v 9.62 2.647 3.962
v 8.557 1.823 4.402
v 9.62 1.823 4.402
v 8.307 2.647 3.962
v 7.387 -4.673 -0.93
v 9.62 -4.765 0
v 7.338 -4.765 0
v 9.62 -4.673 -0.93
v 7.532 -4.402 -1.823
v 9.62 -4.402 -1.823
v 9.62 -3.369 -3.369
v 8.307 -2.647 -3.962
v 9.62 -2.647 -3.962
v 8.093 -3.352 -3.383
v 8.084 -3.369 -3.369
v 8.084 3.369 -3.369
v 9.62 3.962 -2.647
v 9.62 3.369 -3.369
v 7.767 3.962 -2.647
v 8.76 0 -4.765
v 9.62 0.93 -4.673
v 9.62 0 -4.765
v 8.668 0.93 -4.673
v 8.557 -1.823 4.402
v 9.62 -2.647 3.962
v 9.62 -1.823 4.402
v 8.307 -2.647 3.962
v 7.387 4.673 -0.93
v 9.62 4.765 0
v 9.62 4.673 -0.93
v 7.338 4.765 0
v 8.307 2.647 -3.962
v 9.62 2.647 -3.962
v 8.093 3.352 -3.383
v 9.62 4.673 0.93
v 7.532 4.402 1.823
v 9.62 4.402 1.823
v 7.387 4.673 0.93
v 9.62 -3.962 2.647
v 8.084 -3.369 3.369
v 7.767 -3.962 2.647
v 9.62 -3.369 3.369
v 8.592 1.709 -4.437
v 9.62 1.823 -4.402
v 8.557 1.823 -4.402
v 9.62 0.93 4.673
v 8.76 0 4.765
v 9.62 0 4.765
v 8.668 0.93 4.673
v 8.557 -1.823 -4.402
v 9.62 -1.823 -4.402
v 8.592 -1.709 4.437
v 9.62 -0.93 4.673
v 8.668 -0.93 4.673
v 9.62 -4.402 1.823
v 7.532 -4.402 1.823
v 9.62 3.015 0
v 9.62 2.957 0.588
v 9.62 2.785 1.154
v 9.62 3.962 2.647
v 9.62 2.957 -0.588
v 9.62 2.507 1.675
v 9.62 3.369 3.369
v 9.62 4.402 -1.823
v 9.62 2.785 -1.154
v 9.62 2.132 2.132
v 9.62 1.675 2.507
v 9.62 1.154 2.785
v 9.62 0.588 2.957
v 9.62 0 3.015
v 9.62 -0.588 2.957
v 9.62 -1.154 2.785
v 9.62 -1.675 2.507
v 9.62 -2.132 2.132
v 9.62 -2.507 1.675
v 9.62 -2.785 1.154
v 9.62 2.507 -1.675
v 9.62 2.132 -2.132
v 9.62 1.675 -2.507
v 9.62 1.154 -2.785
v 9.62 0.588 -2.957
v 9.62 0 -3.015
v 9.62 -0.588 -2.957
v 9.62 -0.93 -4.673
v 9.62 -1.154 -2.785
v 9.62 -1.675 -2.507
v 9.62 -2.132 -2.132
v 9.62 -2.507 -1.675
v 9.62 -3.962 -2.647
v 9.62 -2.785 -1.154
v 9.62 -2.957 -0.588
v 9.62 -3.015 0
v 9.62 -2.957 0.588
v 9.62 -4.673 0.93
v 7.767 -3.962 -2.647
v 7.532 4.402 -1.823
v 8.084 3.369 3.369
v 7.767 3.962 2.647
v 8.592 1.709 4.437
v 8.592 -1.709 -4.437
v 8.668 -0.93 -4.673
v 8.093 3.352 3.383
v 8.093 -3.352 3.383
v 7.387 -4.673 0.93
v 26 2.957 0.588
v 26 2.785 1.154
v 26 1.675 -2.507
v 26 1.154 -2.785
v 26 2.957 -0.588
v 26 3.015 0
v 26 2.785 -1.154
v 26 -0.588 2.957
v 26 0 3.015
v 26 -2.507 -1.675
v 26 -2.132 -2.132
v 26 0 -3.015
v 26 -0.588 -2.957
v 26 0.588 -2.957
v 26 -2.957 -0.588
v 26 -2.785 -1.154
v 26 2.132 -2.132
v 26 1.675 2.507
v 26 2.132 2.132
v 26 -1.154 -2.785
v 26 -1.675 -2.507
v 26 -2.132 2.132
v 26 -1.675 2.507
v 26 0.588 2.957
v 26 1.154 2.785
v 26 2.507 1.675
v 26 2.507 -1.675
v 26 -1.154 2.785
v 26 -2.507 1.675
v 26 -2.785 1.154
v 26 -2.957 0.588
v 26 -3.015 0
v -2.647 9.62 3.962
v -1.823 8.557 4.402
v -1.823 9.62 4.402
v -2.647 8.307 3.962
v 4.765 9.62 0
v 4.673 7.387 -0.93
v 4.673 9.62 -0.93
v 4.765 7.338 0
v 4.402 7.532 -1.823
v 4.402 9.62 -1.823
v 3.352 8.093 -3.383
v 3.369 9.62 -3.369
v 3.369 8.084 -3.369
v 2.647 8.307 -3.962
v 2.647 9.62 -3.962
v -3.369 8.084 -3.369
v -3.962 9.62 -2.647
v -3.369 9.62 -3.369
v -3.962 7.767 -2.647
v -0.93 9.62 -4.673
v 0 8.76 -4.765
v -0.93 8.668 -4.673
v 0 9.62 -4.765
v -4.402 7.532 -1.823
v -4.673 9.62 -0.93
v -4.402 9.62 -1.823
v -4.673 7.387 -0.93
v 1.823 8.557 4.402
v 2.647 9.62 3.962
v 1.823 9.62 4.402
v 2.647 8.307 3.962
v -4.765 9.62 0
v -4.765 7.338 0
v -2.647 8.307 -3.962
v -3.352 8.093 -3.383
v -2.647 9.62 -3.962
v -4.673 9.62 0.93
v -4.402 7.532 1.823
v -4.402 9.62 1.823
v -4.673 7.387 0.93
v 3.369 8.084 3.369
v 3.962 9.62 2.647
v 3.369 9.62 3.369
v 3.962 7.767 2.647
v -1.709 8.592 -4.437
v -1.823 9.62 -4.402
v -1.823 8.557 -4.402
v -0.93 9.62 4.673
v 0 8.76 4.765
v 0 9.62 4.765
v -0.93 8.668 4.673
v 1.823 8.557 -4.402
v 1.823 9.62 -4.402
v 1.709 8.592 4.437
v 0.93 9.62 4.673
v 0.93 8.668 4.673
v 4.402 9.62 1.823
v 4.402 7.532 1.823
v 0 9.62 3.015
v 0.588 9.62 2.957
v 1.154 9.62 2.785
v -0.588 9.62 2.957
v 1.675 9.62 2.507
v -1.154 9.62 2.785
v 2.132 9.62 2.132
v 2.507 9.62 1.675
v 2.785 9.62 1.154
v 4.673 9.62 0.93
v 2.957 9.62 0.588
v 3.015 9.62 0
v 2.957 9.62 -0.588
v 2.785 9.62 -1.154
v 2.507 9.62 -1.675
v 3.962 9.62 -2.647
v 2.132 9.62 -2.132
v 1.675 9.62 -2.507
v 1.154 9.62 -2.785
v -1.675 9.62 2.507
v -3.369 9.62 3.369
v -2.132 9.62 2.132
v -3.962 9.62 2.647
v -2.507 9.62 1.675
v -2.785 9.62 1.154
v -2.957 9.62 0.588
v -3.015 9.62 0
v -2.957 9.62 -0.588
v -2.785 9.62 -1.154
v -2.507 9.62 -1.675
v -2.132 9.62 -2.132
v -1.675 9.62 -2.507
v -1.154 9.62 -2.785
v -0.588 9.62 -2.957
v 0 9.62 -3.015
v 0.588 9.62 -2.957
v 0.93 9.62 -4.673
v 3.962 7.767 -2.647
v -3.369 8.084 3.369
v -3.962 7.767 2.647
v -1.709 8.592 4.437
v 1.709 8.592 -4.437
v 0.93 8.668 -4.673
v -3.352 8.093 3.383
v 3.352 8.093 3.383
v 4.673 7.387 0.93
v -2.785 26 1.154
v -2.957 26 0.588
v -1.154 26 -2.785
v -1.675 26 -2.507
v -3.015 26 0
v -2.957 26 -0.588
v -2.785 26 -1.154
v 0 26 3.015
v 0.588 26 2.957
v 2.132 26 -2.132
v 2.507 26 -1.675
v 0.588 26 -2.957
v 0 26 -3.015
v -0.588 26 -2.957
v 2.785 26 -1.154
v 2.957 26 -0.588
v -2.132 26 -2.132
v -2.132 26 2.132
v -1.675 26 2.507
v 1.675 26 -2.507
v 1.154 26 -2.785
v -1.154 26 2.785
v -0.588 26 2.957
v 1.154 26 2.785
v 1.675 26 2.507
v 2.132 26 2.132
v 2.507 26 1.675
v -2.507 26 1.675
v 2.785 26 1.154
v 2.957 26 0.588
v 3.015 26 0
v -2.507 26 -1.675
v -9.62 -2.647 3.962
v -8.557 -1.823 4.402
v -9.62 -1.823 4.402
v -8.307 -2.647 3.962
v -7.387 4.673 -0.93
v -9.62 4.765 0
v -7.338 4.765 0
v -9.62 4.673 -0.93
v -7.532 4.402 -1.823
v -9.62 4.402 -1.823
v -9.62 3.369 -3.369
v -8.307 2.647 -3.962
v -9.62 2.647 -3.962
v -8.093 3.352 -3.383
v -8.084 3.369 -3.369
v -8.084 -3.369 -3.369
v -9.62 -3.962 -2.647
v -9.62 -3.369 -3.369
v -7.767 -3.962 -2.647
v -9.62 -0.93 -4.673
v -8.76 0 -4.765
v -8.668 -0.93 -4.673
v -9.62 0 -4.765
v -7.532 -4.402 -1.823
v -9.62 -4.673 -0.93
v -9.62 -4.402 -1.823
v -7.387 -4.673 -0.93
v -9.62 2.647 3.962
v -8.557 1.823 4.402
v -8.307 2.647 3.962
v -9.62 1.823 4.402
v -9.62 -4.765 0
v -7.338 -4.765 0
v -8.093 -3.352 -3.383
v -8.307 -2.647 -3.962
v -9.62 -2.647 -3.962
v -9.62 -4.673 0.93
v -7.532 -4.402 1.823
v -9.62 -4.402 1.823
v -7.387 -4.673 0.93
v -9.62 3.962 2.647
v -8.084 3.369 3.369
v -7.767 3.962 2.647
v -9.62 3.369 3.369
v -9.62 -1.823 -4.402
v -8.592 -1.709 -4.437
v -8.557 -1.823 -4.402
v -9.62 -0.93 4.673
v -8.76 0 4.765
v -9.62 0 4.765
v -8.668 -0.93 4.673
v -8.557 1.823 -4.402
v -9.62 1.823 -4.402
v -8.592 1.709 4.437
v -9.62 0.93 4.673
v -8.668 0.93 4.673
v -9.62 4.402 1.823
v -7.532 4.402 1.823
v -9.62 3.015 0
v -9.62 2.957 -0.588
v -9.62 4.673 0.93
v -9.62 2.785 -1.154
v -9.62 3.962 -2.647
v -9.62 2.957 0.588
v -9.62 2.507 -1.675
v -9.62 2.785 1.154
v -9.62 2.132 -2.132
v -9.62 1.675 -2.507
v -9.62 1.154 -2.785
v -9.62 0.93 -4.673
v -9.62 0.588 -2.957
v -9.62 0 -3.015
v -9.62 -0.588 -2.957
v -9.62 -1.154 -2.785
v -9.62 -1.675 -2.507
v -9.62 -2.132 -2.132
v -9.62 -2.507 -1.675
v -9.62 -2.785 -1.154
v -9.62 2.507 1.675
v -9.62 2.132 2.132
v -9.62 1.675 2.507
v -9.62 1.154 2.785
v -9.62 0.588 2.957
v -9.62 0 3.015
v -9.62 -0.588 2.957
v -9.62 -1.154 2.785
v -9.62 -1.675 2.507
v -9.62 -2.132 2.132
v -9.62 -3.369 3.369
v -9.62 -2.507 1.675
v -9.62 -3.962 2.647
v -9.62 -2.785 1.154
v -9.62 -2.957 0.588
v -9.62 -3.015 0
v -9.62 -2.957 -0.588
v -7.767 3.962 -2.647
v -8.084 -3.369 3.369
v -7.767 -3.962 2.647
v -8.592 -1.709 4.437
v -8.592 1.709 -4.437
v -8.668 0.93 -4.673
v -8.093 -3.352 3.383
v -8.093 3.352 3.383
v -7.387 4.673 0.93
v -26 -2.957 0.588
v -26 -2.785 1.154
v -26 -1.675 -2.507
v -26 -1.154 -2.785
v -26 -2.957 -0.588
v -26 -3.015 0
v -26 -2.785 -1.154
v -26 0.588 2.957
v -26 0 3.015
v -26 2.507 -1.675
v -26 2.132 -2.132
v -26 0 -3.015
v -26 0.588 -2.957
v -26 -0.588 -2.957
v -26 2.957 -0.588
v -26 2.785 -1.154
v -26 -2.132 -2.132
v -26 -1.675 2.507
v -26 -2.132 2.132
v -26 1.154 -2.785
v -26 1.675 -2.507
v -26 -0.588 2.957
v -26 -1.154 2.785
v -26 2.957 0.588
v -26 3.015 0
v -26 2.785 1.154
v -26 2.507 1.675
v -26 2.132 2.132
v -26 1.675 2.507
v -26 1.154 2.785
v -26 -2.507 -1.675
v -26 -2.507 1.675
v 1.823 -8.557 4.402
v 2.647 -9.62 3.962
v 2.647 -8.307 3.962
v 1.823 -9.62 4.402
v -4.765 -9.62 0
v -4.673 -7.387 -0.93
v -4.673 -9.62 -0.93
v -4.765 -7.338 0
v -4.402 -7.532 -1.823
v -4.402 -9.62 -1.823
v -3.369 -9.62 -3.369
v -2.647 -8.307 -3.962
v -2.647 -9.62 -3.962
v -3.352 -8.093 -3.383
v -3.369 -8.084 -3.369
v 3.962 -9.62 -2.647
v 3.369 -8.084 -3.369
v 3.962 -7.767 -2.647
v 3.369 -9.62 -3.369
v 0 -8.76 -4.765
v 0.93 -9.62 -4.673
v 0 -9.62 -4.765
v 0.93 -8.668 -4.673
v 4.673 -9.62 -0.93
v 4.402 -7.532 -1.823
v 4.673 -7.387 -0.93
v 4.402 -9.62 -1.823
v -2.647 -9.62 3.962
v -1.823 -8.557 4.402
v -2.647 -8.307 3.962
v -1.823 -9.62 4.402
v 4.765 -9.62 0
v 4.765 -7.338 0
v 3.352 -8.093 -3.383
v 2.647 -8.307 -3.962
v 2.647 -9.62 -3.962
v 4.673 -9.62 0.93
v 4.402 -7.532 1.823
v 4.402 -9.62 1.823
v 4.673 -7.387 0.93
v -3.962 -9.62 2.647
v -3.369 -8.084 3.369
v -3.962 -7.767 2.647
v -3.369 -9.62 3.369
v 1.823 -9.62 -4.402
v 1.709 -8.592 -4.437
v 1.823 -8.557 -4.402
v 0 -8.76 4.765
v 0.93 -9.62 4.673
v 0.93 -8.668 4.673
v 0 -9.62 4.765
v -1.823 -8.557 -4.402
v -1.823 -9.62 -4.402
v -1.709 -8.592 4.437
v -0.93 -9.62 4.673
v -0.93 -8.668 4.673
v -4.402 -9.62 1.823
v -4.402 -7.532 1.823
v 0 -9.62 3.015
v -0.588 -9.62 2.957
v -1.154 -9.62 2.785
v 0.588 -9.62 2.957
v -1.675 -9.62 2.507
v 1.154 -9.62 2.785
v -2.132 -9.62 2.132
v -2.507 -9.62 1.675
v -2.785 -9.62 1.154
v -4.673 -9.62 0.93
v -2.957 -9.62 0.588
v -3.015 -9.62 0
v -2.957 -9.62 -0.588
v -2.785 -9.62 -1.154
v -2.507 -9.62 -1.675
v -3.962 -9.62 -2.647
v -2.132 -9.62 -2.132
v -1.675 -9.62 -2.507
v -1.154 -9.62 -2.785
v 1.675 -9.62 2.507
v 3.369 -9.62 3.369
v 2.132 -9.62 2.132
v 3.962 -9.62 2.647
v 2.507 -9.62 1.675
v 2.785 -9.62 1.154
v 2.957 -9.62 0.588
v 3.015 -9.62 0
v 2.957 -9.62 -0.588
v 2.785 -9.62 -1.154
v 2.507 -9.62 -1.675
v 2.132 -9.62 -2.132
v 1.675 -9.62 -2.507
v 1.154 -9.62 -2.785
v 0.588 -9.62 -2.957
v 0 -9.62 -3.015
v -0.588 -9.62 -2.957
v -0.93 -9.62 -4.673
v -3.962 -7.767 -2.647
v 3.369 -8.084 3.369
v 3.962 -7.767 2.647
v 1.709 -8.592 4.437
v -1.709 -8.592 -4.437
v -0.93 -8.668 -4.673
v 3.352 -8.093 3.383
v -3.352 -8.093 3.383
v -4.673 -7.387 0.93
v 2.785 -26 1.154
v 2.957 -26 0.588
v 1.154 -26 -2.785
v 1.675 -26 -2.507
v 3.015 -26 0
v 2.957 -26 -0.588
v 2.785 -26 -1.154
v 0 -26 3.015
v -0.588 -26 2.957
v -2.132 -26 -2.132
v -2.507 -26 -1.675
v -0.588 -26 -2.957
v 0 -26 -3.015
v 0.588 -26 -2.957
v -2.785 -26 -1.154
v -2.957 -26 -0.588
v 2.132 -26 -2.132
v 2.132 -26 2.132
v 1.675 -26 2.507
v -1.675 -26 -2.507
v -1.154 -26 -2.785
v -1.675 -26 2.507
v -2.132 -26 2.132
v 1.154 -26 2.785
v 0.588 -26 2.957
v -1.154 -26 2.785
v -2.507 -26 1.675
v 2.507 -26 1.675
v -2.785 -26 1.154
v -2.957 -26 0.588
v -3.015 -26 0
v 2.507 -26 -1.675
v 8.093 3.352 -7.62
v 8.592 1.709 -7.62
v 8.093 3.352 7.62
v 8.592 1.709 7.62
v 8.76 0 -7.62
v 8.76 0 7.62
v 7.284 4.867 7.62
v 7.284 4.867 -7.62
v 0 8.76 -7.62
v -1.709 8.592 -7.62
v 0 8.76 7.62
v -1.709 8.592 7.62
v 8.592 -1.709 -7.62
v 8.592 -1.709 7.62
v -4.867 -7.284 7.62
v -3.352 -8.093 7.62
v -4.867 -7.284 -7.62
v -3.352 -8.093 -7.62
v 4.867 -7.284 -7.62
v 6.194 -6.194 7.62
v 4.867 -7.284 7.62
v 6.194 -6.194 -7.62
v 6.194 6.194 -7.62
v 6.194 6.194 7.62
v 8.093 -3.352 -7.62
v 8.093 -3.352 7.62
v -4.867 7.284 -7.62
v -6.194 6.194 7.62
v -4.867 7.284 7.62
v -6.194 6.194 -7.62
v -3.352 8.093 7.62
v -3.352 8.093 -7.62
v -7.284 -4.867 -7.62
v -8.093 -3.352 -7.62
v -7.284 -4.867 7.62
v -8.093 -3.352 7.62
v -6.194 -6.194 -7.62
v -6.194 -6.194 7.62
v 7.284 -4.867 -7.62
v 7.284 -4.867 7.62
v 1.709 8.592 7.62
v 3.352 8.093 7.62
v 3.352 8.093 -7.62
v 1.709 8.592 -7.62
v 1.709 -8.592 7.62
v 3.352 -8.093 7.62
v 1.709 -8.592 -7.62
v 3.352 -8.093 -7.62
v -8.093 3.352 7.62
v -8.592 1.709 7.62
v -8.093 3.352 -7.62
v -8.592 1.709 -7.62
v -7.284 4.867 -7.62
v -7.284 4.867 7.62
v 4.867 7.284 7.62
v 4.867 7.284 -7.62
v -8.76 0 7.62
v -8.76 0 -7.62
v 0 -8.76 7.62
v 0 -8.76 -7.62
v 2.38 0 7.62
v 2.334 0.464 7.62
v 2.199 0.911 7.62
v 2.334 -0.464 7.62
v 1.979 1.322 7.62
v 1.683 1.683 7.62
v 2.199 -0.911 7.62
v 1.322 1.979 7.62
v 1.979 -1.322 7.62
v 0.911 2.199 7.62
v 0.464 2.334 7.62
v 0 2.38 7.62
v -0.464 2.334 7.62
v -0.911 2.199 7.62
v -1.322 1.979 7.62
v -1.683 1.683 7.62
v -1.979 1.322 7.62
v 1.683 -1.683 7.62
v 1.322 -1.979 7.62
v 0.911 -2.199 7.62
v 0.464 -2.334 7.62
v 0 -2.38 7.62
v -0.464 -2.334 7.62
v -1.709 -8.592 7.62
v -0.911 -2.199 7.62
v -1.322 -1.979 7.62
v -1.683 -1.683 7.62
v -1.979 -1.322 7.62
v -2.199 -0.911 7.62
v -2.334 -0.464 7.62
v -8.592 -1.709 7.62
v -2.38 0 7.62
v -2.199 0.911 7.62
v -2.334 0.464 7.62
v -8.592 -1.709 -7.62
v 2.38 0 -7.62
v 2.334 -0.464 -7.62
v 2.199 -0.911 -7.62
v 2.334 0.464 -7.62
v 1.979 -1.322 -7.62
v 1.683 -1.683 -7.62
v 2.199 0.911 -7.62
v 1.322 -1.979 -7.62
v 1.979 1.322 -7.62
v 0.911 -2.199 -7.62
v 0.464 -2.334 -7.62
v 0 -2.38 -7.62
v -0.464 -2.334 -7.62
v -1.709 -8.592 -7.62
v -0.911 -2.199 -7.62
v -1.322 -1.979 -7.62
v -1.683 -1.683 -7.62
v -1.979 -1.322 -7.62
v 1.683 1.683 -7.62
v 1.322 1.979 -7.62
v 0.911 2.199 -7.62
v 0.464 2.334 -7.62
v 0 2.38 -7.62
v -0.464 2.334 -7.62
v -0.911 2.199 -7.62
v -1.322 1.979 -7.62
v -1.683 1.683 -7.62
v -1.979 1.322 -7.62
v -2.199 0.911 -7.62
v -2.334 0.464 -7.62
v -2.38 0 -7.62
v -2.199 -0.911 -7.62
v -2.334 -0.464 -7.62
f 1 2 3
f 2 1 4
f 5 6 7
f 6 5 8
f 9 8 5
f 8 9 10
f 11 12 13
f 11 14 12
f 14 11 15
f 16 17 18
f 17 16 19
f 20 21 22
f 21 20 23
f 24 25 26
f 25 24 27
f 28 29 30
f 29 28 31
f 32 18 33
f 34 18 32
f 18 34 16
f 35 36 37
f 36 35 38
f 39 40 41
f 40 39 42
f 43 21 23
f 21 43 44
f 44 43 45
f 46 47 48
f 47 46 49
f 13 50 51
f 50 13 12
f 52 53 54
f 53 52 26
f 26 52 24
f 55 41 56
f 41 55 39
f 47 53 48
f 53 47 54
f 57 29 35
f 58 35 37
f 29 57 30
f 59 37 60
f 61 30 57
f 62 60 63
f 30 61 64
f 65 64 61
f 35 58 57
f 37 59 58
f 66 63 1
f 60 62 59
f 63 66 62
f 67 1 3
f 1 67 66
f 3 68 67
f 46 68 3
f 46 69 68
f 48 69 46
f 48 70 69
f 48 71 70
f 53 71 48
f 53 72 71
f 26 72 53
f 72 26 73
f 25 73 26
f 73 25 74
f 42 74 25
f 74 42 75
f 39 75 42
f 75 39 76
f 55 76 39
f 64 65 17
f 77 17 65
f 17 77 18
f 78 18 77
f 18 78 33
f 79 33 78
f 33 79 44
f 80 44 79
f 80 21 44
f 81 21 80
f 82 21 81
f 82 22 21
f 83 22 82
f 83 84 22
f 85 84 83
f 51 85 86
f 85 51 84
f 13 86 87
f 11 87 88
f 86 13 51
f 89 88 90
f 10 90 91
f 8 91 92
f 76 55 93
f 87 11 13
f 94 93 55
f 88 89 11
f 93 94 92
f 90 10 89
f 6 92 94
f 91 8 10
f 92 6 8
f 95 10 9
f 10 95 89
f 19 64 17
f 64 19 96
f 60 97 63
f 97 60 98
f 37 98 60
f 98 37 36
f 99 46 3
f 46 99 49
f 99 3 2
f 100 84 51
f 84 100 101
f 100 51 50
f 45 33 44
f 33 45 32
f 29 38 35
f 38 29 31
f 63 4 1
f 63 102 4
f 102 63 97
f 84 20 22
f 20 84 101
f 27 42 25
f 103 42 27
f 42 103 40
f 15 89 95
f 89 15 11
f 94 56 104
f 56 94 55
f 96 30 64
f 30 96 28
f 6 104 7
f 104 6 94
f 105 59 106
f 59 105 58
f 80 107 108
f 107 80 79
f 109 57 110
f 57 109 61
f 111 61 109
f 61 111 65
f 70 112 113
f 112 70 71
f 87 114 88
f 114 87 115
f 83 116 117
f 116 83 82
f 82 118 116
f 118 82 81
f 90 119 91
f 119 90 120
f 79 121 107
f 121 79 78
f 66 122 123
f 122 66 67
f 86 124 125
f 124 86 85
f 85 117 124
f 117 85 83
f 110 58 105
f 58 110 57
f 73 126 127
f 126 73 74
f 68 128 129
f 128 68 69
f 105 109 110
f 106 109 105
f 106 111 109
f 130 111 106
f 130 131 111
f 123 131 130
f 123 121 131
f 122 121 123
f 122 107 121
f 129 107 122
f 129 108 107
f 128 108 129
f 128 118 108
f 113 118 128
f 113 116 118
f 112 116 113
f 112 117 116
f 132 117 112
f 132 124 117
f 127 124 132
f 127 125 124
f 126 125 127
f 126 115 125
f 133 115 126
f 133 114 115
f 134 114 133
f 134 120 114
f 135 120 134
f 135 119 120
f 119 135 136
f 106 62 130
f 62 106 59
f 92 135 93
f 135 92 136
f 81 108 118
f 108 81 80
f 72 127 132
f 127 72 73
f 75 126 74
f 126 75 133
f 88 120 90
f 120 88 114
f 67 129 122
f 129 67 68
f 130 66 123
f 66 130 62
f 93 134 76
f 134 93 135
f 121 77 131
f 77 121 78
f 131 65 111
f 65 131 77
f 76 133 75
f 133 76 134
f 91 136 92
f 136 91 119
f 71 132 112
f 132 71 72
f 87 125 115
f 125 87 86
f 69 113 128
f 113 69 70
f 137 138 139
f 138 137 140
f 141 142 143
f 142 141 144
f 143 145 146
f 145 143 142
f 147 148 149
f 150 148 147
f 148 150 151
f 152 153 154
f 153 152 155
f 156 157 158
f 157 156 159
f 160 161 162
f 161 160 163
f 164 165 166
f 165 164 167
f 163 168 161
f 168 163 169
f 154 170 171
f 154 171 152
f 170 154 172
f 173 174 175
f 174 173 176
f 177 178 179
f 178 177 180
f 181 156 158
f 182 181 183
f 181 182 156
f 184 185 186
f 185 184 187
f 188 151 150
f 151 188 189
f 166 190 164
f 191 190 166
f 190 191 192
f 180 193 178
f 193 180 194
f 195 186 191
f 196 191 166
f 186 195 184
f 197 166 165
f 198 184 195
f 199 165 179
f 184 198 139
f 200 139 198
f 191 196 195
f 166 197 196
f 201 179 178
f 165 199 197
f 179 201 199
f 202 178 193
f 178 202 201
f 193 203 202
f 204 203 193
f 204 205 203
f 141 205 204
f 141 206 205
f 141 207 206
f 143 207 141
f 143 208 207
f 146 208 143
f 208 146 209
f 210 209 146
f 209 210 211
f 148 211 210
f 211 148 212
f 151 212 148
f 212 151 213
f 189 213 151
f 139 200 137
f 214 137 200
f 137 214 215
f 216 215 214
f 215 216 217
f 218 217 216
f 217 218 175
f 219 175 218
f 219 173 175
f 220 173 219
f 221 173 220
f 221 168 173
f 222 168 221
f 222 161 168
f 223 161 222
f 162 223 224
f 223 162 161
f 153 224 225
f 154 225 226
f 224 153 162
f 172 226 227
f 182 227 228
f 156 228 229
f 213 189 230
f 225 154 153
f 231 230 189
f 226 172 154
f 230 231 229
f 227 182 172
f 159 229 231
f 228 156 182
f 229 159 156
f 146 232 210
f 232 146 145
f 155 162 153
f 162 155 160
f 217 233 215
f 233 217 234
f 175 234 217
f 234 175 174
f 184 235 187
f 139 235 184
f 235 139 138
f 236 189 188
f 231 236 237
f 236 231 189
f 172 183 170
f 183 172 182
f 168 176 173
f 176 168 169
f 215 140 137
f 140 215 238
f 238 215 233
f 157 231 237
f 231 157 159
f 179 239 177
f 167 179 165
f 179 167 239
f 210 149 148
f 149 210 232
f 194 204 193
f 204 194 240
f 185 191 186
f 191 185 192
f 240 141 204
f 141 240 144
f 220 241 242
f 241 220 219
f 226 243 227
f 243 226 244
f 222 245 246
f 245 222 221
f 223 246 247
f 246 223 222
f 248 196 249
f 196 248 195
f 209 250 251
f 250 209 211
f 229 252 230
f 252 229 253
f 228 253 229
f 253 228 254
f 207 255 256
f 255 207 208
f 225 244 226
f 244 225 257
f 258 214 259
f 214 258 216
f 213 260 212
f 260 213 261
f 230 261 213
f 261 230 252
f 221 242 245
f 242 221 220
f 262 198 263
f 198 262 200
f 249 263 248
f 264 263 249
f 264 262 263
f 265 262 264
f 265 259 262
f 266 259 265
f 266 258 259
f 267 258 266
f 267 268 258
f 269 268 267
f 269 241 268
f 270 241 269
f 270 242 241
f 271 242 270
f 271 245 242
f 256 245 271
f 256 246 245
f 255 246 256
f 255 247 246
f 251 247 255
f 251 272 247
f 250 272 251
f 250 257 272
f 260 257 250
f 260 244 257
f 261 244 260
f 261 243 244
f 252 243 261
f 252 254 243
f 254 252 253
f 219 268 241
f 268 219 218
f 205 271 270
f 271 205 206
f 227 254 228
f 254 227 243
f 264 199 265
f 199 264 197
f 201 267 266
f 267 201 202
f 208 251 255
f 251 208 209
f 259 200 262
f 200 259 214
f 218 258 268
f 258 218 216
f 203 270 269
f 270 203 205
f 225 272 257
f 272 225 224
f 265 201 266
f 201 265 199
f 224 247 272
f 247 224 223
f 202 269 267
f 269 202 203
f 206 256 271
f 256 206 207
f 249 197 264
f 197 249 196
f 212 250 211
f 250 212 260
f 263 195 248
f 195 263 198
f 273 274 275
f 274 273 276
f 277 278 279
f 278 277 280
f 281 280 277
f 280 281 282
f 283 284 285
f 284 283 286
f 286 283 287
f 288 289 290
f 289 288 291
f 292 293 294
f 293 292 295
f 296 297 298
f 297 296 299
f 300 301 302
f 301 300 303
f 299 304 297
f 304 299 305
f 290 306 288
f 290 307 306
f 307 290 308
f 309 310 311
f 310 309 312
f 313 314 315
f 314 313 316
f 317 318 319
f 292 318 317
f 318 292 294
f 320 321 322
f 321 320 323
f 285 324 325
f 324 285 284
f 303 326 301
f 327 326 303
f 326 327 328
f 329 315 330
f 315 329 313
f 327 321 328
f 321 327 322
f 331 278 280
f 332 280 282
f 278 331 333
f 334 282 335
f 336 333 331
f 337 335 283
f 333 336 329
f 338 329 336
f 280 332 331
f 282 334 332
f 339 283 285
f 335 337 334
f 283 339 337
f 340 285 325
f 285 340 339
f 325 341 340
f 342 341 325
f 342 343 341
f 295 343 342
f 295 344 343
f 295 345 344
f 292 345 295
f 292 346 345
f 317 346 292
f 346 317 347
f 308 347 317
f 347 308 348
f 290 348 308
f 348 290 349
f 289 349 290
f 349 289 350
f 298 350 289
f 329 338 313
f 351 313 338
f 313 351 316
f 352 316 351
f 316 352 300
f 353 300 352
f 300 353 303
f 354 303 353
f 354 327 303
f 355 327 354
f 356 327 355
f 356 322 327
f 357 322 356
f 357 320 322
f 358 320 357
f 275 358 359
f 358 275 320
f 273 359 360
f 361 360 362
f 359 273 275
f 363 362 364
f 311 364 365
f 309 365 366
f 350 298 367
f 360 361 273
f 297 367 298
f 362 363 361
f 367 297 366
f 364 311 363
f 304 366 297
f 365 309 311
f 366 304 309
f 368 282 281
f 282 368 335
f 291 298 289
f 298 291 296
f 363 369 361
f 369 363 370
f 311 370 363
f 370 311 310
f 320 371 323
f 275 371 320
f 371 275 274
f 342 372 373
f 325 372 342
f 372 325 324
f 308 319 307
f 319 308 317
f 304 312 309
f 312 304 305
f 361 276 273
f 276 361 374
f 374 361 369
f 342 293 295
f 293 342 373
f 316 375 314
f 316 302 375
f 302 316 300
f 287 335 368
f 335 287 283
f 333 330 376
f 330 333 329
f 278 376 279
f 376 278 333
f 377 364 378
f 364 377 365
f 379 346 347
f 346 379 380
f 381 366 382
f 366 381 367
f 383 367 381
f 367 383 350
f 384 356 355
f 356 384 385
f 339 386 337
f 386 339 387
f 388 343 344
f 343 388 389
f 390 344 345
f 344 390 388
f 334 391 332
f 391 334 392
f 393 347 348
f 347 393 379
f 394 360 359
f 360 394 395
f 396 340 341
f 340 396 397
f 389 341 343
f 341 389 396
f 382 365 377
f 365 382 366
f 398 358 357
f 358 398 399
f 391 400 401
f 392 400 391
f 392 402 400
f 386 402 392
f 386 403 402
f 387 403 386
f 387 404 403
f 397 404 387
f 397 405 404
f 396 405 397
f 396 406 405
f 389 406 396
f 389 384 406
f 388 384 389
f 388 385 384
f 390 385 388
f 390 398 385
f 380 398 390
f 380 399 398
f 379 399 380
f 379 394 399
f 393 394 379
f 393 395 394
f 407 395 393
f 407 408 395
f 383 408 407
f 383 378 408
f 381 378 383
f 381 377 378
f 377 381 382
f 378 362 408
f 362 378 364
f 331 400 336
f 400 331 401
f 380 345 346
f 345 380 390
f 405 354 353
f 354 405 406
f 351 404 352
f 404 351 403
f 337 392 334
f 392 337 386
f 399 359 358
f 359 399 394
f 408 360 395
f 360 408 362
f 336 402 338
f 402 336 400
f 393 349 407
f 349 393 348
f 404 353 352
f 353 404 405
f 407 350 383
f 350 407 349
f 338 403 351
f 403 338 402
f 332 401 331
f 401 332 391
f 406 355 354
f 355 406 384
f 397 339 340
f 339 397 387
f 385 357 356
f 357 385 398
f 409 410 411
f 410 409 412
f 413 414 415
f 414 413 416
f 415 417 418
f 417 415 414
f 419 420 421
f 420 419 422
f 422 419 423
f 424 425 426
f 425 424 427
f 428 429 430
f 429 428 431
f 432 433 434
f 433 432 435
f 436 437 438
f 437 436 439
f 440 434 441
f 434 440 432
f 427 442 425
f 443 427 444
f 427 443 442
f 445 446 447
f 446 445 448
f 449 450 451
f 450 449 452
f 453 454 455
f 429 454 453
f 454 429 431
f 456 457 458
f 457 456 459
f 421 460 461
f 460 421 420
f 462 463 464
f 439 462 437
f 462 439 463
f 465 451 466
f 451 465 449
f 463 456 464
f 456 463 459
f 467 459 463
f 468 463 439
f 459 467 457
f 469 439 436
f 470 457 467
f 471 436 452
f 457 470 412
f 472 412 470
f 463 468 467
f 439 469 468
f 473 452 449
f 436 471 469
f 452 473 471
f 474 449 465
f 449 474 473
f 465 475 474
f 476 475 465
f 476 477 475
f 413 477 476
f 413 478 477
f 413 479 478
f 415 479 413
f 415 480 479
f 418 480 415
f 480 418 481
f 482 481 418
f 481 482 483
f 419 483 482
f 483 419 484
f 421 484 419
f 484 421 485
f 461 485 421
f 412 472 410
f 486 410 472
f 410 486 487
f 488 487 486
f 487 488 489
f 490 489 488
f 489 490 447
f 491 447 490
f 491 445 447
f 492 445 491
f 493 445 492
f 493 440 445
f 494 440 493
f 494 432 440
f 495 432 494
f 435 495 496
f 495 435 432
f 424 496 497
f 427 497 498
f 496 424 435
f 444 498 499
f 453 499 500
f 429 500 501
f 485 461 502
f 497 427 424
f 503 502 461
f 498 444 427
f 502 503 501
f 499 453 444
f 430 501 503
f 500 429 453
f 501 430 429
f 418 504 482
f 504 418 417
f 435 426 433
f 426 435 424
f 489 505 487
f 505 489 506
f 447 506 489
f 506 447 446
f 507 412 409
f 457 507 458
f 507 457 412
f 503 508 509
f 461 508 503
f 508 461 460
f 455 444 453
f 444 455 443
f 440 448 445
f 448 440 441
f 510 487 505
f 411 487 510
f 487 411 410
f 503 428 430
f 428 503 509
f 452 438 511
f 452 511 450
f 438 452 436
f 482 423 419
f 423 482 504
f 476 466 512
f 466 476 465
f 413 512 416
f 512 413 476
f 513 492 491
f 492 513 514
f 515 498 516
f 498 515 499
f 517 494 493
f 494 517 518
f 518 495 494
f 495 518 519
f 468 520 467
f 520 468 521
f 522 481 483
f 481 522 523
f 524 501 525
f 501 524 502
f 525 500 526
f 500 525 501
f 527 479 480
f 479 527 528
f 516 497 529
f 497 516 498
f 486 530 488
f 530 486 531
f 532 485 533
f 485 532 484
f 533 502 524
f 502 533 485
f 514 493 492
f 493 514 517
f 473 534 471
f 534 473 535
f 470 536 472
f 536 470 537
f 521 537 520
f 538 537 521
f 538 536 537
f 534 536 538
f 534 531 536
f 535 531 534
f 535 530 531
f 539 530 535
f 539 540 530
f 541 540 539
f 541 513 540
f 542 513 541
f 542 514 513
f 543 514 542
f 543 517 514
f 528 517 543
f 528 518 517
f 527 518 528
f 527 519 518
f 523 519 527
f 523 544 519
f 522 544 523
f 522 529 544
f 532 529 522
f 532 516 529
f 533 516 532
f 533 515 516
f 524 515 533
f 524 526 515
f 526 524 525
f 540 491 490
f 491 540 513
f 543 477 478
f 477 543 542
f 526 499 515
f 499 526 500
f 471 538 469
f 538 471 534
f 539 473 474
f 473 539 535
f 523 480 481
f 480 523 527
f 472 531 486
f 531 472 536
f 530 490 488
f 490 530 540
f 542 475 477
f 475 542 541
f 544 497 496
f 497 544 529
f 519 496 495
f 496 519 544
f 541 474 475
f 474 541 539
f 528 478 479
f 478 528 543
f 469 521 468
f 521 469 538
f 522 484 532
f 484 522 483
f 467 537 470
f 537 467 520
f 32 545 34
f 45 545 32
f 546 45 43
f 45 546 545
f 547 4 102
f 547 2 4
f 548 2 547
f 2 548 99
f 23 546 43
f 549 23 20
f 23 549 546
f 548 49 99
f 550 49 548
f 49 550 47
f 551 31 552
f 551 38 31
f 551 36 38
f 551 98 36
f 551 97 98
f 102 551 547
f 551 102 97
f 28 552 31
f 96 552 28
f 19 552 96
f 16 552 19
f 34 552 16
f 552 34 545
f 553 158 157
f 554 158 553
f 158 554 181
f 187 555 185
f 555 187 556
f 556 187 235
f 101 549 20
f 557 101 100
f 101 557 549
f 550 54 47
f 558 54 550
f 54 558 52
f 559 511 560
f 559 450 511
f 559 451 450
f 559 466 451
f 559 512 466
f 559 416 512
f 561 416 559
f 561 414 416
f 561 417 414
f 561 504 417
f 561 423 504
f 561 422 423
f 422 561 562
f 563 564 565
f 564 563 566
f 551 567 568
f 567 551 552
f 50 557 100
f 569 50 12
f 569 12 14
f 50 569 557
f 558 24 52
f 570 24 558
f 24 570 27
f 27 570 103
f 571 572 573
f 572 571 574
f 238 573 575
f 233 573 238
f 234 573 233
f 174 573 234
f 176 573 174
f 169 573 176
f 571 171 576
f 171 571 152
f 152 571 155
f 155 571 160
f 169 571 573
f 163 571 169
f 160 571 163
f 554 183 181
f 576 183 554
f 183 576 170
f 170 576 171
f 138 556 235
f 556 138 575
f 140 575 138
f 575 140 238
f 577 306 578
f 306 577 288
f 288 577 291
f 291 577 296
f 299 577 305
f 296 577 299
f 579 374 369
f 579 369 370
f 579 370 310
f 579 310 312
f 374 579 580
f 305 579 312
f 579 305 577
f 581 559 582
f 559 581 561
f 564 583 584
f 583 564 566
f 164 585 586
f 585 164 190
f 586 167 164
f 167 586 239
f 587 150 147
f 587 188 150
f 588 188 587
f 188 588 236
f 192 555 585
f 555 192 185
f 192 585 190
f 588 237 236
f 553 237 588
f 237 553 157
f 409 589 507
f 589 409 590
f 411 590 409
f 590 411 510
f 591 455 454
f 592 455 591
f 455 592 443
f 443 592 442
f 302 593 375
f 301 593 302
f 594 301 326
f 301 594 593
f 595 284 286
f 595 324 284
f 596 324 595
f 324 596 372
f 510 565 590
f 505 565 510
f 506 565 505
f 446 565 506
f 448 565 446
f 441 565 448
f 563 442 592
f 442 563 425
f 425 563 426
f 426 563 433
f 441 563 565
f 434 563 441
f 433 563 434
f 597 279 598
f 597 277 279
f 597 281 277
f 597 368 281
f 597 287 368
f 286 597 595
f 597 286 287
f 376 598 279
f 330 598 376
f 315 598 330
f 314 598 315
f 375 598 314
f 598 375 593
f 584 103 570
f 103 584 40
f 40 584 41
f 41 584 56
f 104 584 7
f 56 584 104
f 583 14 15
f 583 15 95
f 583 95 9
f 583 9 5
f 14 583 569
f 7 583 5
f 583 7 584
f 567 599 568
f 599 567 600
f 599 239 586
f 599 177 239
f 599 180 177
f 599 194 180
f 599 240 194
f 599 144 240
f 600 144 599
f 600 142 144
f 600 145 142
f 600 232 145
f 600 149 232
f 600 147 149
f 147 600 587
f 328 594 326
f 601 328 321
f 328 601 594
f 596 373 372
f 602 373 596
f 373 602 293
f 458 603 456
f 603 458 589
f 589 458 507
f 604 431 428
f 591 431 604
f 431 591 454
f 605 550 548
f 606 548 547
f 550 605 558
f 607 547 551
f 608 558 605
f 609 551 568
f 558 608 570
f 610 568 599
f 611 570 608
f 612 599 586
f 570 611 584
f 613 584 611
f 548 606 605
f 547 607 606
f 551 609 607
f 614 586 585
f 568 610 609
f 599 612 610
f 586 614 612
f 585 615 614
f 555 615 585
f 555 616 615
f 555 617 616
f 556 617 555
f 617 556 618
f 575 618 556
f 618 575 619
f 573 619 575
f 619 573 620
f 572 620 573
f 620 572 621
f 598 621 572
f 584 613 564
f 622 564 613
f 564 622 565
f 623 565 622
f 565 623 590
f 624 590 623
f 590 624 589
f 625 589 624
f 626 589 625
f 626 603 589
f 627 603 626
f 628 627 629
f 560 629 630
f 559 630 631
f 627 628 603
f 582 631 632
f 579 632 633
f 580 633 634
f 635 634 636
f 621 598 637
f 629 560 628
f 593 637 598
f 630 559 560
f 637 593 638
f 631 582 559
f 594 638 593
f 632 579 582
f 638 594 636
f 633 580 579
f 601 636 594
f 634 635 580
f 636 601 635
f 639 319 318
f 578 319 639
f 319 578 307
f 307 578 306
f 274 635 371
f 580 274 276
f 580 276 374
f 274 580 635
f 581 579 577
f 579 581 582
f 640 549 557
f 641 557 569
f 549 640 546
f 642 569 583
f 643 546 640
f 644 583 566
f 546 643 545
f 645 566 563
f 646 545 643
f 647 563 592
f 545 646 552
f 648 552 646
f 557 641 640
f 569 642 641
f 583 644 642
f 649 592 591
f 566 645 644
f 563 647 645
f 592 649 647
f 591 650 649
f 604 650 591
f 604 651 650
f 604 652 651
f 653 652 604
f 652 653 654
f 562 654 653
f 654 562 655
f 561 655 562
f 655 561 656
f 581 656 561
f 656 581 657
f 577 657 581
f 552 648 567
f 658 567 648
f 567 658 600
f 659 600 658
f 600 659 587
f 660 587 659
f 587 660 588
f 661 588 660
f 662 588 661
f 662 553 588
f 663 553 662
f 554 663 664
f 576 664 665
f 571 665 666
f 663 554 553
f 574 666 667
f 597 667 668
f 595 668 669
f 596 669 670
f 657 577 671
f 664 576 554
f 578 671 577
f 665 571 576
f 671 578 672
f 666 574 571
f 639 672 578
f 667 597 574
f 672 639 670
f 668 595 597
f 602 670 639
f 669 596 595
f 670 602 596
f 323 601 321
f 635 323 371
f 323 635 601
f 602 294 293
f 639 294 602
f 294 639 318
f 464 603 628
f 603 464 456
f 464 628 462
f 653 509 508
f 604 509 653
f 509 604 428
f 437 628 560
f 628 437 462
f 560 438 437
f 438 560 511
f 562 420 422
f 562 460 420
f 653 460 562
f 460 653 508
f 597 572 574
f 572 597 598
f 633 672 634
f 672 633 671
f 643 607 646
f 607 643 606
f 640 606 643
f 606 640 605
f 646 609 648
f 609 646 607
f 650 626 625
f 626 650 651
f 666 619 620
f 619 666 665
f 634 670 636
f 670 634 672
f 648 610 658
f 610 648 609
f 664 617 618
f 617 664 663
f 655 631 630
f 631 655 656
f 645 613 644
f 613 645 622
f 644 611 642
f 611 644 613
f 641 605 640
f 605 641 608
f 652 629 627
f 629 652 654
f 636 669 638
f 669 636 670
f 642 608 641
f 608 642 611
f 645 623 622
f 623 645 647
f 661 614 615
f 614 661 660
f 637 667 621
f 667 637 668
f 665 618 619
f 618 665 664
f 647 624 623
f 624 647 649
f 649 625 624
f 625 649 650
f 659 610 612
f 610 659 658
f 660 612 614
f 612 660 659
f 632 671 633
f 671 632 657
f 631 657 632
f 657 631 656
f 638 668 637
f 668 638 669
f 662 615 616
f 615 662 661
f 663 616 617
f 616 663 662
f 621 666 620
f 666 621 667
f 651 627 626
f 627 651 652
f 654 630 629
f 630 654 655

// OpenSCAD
$fn = 32;

// ----------------------------------------------------------------------
// Cardan cross: 52 mm span, 9.53 mm trunnions
// ----------------------------------------------------------------------

// --- parameters (mm) ---
journal_d = 9.53;         // trunnion diameter
arm_len = 26;             // trunnion length from the centre
step_r = 3.24;            // step position from the centre
step_d = 6.03;            // journal diameter after the step
hub_d = 17.52;            // hub diameter
hub_h = 15.24;            // hub height
bore_d = 4.76;            // hub bore

difference() {
  union() {
    /* hub along the joint axis */
    cylinder(h = hub_h, d = hub_d, center = true);
    for (a = [0 : 90 : 270]) rotate([0, 0, a]) {
      /* trunnion, sunk into the hub */
      translate([hub_d / 4, 0, 0]) rotate([0, 90, 0]) cylinder(h = step_r + 2, d = journal_d);
      /* stepped journal out to the tip */
      translate([step_r - 0.5, 0, 0]) rotate([0, 90, 0]) cylinder(h = arm_len + 0.5 - step_r, d = step_d);
    }
  }
  /* lubrication bore through the hub, 2.5 mm clear on both sides */
  translate([0, 0, -hub_h / 2 - 2.5]) cylinder(h = hub_h + 5, d = bore_d);
}
